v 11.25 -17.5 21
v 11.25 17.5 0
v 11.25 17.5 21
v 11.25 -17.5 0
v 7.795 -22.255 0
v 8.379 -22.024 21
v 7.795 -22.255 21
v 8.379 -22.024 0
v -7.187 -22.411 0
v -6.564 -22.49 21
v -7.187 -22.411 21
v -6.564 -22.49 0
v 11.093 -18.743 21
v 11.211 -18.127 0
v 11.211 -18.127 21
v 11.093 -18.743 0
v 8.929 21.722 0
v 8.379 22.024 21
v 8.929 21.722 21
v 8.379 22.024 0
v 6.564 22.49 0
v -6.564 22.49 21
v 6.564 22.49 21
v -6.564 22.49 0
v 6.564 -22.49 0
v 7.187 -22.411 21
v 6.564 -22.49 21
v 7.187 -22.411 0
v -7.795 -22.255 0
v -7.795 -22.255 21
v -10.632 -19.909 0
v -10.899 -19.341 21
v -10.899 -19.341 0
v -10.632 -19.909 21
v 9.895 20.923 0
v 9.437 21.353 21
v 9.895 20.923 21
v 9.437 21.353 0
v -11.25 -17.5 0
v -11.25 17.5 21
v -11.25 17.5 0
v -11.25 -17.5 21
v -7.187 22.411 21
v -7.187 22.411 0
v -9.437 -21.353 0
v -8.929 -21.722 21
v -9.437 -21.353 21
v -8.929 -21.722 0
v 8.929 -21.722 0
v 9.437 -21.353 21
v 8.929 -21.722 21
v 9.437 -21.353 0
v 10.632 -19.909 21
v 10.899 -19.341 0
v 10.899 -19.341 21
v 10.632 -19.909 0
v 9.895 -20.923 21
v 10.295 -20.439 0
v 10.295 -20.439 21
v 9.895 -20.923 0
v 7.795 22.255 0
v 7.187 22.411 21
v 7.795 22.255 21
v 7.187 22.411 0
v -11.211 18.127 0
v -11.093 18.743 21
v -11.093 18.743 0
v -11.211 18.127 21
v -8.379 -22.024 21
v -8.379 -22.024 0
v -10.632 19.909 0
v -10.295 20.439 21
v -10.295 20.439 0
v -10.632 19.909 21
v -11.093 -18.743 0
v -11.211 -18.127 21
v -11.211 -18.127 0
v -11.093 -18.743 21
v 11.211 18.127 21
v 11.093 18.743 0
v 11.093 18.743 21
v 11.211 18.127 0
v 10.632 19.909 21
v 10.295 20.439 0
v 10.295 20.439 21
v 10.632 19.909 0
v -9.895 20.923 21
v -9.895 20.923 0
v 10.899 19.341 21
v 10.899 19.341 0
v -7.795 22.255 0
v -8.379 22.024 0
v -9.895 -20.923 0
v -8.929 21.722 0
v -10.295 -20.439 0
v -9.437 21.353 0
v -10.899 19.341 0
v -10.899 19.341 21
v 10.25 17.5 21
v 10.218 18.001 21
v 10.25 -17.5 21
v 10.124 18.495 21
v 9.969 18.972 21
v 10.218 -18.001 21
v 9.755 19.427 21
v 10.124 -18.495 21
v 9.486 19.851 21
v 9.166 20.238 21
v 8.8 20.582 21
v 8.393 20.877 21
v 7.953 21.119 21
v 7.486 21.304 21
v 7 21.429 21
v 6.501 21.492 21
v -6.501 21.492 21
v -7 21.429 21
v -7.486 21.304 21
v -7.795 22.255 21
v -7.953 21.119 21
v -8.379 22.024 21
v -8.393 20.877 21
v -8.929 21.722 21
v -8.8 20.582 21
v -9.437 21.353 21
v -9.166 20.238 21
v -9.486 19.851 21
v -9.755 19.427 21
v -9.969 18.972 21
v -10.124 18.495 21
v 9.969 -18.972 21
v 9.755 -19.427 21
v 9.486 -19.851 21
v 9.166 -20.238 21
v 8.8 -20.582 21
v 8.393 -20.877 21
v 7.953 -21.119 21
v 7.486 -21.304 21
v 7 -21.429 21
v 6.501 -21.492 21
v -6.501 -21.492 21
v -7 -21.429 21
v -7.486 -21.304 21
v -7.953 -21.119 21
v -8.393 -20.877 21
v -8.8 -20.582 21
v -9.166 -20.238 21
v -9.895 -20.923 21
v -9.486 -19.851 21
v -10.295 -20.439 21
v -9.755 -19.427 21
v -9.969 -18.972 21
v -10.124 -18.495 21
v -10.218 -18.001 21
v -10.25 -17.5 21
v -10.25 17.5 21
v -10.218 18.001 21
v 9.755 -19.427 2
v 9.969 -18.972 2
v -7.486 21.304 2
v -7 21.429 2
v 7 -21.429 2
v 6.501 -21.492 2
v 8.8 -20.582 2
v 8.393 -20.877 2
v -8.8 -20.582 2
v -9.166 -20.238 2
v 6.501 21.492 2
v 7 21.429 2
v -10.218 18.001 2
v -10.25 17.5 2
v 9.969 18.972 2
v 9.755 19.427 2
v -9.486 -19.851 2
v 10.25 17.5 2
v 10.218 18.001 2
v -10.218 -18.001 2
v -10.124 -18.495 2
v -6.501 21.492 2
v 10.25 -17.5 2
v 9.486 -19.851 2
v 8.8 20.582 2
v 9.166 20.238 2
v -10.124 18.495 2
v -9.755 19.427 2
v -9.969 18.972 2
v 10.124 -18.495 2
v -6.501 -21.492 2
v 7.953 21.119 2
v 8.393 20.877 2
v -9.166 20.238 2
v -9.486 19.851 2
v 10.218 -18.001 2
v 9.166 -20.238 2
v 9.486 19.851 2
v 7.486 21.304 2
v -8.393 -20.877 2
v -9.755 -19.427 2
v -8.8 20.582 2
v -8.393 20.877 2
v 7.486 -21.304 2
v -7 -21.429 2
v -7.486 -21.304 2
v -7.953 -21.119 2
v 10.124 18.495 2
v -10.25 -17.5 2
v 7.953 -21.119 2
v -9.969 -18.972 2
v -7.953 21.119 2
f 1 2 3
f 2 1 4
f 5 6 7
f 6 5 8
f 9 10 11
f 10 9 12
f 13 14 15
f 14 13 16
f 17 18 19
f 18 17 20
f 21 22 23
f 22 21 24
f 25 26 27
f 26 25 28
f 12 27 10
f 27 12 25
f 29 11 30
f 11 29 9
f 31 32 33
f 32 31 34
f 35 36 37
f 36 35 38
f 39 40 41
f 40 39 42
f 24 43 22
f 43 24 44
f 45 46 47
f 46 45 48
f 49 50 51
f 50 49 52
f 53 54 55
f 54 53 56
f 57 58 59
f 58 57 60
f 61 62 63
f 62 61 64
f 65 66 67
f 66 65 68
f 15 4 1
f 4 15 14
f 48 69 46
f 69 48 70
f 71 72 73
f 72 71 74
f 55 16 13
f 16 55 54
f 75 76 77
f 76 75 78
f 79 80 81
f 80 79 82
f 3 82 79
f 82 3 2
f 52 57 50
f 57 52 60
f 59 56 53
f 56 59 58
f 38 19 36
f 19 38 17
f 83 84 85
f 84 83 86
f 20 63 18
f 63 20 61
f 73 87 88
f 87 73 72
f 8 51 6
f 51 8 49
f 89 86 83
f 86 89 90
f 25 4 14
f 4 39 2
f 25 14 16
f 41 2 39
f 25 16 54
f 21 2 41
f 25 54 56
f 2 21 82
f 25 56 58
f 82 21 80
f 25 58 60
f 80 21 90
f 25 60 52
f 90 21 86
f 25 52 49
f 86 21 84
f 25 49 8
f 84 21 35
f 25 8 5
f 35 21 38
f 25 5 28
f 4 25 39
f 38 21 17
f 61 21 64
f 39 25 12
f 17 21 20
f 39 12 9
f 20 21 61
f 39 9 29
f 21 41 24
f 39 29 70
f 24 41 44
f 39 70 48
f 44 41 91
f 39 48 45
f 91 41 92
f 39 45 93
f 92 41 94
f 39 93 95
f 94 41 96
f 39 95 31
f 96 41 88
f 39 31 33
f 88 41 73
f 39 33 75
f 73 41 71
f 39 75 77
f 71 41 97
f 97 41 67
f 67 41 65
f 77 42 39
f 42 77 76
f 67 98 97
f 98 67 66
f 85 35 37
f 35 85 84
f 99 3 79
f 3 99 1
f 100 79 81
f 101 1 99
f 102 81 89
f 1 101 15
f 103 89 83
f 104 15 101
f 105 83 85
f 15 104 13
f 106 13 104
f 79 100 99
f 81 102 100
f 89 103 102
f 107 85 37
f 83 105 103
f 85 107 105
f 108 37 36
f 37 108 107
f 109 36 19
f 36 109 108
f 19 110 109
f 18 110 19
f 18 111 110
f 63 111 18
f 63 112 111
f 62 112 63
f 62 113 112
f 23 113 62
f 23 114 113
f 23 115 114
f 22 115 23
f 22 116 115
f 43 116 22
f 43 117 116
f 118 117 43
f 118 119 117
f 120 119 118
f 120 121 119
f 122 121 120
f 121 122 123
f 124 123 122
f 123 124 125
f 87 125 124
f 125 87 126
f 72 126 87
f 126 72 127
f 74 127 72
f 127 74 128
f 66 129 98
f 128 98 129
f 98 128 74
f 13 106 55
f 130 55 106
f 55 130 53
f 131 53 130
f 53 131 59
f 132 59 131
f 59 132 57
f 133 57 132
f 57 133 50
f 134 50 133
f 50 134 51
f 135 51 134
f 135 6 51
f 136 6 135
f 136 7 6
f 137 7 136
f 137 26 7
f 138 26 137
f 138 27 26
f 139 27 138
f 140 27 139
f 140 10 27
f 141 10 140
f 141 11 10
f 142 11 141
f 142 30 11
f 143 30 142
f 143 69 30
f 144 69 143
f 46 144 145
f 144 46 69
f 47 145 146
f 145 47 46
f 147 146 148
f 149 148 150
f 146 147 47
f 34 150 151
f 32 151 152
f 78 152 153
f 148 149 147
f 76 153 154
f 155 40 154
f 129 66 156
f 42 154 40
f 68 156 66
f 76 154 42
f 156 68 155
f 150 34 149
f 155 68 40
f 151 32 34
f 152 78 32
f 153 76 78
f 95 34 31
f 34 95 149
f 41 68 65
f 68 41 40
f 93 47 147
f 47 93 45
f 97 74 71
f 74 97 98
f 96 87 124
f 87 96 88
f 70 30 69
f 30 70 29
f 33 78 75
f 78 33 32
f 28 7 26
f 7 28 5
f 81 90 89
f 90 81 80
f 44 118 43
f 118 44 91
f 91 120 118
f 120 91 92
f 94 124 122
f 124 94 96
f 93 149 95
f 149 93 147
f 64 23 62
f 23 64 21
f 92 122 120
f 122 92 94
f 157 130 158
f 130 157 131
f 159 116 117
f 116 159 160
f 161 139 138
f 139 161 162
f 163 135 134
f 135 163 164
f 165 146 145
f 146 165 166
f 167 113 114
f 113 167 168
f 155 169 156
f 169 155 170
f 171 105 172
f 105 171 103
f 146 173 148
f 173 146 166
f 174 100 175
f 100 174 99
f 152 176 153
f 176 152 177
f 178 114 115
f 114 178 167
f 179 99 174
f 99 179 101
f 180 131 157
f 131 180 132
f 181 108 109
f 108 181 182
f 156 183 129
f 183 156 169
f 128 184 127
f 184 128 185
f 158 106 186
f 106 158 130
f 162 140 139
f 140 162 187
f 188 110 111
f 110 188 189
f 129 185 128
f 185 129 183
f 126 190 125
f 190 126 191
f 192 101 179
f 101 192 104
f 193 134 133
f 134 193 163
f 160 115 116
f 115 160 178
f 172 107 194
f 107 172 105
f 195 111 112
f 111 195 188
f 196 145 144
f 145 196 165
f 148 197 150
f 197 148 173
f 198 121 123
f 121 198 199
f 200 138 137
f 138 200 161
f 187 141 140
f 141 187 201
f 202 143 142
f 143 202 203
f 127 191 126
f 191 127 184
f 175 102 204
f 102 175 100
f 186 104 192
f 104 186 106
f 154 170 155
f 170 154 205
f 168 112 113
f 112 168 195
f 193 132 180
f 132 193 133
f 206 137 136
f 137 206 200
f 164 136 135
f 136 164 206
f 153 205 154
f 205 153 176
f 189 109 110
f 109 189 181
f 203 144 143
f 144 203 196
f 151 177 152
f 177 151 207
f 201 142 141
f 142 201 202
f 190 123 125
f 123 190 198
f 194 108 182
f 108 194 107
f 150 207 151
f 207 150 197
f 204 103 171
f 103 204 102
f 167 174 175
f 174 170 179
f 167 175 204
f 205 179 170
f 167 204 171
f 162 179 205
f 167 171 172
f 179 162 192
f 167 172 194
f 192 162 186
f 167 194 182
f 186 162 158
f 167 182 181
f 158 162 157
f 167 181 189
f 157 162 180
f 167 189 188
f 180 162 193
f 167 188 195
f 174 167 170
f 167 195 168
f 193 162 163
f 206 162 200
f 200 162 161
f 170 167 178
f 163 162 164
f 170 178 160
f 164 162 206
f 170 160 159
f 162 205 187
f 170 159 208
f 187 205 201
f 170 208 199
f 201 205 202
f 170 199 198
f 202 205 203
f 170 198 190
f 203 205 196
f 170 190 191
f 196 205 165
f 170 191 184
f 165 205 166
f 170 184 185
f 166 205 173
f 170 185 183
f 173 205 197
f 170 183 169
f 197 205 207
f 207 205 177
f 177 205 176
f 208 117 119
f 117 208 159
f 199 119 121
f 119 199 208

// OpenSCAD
$fn = 50;


difference() {
	union() {
		hull() {
			translate(v = [-6.2500000000, 17.5000000000, 0]) {
				cylinder(h = 21, r = 5);
			}
			translate(v = [6.2500000000, 17.5000000000, 0]) {
				cylinder(h = 21, r = 5);
			}
			translate(v = [-6.2500000000, -17.5000000000, 0]) {
				cylinder(h = 21, r = 5);
			}
			translate(v = [6.2500000000, -17.5000000000, 0]) {
				cylinder(h = 21, r = 5);
			}
		}
	}
	union() {
		translate(v = [0, 0, 2]) {
			hull() {
				translate(v = [-6.2500000000, 17.5000000000, 0]) {
					cylinder(h = 19, r = 4);
				}
				translate(v = [6.2500000000, 17.5000000000, 0]) {
					cylinder(h = 19, r = 4);
				}
				translate(v = [-6.2500000000, -17.5000000000, 0]) {
					cylinder(h = 19, r = 4);
				}
				translate(v = [6.2500000000, -17.5000000000, 0]) {
					cylinder(h = 19, r = 4);
				}
			}
		}
	}
}
